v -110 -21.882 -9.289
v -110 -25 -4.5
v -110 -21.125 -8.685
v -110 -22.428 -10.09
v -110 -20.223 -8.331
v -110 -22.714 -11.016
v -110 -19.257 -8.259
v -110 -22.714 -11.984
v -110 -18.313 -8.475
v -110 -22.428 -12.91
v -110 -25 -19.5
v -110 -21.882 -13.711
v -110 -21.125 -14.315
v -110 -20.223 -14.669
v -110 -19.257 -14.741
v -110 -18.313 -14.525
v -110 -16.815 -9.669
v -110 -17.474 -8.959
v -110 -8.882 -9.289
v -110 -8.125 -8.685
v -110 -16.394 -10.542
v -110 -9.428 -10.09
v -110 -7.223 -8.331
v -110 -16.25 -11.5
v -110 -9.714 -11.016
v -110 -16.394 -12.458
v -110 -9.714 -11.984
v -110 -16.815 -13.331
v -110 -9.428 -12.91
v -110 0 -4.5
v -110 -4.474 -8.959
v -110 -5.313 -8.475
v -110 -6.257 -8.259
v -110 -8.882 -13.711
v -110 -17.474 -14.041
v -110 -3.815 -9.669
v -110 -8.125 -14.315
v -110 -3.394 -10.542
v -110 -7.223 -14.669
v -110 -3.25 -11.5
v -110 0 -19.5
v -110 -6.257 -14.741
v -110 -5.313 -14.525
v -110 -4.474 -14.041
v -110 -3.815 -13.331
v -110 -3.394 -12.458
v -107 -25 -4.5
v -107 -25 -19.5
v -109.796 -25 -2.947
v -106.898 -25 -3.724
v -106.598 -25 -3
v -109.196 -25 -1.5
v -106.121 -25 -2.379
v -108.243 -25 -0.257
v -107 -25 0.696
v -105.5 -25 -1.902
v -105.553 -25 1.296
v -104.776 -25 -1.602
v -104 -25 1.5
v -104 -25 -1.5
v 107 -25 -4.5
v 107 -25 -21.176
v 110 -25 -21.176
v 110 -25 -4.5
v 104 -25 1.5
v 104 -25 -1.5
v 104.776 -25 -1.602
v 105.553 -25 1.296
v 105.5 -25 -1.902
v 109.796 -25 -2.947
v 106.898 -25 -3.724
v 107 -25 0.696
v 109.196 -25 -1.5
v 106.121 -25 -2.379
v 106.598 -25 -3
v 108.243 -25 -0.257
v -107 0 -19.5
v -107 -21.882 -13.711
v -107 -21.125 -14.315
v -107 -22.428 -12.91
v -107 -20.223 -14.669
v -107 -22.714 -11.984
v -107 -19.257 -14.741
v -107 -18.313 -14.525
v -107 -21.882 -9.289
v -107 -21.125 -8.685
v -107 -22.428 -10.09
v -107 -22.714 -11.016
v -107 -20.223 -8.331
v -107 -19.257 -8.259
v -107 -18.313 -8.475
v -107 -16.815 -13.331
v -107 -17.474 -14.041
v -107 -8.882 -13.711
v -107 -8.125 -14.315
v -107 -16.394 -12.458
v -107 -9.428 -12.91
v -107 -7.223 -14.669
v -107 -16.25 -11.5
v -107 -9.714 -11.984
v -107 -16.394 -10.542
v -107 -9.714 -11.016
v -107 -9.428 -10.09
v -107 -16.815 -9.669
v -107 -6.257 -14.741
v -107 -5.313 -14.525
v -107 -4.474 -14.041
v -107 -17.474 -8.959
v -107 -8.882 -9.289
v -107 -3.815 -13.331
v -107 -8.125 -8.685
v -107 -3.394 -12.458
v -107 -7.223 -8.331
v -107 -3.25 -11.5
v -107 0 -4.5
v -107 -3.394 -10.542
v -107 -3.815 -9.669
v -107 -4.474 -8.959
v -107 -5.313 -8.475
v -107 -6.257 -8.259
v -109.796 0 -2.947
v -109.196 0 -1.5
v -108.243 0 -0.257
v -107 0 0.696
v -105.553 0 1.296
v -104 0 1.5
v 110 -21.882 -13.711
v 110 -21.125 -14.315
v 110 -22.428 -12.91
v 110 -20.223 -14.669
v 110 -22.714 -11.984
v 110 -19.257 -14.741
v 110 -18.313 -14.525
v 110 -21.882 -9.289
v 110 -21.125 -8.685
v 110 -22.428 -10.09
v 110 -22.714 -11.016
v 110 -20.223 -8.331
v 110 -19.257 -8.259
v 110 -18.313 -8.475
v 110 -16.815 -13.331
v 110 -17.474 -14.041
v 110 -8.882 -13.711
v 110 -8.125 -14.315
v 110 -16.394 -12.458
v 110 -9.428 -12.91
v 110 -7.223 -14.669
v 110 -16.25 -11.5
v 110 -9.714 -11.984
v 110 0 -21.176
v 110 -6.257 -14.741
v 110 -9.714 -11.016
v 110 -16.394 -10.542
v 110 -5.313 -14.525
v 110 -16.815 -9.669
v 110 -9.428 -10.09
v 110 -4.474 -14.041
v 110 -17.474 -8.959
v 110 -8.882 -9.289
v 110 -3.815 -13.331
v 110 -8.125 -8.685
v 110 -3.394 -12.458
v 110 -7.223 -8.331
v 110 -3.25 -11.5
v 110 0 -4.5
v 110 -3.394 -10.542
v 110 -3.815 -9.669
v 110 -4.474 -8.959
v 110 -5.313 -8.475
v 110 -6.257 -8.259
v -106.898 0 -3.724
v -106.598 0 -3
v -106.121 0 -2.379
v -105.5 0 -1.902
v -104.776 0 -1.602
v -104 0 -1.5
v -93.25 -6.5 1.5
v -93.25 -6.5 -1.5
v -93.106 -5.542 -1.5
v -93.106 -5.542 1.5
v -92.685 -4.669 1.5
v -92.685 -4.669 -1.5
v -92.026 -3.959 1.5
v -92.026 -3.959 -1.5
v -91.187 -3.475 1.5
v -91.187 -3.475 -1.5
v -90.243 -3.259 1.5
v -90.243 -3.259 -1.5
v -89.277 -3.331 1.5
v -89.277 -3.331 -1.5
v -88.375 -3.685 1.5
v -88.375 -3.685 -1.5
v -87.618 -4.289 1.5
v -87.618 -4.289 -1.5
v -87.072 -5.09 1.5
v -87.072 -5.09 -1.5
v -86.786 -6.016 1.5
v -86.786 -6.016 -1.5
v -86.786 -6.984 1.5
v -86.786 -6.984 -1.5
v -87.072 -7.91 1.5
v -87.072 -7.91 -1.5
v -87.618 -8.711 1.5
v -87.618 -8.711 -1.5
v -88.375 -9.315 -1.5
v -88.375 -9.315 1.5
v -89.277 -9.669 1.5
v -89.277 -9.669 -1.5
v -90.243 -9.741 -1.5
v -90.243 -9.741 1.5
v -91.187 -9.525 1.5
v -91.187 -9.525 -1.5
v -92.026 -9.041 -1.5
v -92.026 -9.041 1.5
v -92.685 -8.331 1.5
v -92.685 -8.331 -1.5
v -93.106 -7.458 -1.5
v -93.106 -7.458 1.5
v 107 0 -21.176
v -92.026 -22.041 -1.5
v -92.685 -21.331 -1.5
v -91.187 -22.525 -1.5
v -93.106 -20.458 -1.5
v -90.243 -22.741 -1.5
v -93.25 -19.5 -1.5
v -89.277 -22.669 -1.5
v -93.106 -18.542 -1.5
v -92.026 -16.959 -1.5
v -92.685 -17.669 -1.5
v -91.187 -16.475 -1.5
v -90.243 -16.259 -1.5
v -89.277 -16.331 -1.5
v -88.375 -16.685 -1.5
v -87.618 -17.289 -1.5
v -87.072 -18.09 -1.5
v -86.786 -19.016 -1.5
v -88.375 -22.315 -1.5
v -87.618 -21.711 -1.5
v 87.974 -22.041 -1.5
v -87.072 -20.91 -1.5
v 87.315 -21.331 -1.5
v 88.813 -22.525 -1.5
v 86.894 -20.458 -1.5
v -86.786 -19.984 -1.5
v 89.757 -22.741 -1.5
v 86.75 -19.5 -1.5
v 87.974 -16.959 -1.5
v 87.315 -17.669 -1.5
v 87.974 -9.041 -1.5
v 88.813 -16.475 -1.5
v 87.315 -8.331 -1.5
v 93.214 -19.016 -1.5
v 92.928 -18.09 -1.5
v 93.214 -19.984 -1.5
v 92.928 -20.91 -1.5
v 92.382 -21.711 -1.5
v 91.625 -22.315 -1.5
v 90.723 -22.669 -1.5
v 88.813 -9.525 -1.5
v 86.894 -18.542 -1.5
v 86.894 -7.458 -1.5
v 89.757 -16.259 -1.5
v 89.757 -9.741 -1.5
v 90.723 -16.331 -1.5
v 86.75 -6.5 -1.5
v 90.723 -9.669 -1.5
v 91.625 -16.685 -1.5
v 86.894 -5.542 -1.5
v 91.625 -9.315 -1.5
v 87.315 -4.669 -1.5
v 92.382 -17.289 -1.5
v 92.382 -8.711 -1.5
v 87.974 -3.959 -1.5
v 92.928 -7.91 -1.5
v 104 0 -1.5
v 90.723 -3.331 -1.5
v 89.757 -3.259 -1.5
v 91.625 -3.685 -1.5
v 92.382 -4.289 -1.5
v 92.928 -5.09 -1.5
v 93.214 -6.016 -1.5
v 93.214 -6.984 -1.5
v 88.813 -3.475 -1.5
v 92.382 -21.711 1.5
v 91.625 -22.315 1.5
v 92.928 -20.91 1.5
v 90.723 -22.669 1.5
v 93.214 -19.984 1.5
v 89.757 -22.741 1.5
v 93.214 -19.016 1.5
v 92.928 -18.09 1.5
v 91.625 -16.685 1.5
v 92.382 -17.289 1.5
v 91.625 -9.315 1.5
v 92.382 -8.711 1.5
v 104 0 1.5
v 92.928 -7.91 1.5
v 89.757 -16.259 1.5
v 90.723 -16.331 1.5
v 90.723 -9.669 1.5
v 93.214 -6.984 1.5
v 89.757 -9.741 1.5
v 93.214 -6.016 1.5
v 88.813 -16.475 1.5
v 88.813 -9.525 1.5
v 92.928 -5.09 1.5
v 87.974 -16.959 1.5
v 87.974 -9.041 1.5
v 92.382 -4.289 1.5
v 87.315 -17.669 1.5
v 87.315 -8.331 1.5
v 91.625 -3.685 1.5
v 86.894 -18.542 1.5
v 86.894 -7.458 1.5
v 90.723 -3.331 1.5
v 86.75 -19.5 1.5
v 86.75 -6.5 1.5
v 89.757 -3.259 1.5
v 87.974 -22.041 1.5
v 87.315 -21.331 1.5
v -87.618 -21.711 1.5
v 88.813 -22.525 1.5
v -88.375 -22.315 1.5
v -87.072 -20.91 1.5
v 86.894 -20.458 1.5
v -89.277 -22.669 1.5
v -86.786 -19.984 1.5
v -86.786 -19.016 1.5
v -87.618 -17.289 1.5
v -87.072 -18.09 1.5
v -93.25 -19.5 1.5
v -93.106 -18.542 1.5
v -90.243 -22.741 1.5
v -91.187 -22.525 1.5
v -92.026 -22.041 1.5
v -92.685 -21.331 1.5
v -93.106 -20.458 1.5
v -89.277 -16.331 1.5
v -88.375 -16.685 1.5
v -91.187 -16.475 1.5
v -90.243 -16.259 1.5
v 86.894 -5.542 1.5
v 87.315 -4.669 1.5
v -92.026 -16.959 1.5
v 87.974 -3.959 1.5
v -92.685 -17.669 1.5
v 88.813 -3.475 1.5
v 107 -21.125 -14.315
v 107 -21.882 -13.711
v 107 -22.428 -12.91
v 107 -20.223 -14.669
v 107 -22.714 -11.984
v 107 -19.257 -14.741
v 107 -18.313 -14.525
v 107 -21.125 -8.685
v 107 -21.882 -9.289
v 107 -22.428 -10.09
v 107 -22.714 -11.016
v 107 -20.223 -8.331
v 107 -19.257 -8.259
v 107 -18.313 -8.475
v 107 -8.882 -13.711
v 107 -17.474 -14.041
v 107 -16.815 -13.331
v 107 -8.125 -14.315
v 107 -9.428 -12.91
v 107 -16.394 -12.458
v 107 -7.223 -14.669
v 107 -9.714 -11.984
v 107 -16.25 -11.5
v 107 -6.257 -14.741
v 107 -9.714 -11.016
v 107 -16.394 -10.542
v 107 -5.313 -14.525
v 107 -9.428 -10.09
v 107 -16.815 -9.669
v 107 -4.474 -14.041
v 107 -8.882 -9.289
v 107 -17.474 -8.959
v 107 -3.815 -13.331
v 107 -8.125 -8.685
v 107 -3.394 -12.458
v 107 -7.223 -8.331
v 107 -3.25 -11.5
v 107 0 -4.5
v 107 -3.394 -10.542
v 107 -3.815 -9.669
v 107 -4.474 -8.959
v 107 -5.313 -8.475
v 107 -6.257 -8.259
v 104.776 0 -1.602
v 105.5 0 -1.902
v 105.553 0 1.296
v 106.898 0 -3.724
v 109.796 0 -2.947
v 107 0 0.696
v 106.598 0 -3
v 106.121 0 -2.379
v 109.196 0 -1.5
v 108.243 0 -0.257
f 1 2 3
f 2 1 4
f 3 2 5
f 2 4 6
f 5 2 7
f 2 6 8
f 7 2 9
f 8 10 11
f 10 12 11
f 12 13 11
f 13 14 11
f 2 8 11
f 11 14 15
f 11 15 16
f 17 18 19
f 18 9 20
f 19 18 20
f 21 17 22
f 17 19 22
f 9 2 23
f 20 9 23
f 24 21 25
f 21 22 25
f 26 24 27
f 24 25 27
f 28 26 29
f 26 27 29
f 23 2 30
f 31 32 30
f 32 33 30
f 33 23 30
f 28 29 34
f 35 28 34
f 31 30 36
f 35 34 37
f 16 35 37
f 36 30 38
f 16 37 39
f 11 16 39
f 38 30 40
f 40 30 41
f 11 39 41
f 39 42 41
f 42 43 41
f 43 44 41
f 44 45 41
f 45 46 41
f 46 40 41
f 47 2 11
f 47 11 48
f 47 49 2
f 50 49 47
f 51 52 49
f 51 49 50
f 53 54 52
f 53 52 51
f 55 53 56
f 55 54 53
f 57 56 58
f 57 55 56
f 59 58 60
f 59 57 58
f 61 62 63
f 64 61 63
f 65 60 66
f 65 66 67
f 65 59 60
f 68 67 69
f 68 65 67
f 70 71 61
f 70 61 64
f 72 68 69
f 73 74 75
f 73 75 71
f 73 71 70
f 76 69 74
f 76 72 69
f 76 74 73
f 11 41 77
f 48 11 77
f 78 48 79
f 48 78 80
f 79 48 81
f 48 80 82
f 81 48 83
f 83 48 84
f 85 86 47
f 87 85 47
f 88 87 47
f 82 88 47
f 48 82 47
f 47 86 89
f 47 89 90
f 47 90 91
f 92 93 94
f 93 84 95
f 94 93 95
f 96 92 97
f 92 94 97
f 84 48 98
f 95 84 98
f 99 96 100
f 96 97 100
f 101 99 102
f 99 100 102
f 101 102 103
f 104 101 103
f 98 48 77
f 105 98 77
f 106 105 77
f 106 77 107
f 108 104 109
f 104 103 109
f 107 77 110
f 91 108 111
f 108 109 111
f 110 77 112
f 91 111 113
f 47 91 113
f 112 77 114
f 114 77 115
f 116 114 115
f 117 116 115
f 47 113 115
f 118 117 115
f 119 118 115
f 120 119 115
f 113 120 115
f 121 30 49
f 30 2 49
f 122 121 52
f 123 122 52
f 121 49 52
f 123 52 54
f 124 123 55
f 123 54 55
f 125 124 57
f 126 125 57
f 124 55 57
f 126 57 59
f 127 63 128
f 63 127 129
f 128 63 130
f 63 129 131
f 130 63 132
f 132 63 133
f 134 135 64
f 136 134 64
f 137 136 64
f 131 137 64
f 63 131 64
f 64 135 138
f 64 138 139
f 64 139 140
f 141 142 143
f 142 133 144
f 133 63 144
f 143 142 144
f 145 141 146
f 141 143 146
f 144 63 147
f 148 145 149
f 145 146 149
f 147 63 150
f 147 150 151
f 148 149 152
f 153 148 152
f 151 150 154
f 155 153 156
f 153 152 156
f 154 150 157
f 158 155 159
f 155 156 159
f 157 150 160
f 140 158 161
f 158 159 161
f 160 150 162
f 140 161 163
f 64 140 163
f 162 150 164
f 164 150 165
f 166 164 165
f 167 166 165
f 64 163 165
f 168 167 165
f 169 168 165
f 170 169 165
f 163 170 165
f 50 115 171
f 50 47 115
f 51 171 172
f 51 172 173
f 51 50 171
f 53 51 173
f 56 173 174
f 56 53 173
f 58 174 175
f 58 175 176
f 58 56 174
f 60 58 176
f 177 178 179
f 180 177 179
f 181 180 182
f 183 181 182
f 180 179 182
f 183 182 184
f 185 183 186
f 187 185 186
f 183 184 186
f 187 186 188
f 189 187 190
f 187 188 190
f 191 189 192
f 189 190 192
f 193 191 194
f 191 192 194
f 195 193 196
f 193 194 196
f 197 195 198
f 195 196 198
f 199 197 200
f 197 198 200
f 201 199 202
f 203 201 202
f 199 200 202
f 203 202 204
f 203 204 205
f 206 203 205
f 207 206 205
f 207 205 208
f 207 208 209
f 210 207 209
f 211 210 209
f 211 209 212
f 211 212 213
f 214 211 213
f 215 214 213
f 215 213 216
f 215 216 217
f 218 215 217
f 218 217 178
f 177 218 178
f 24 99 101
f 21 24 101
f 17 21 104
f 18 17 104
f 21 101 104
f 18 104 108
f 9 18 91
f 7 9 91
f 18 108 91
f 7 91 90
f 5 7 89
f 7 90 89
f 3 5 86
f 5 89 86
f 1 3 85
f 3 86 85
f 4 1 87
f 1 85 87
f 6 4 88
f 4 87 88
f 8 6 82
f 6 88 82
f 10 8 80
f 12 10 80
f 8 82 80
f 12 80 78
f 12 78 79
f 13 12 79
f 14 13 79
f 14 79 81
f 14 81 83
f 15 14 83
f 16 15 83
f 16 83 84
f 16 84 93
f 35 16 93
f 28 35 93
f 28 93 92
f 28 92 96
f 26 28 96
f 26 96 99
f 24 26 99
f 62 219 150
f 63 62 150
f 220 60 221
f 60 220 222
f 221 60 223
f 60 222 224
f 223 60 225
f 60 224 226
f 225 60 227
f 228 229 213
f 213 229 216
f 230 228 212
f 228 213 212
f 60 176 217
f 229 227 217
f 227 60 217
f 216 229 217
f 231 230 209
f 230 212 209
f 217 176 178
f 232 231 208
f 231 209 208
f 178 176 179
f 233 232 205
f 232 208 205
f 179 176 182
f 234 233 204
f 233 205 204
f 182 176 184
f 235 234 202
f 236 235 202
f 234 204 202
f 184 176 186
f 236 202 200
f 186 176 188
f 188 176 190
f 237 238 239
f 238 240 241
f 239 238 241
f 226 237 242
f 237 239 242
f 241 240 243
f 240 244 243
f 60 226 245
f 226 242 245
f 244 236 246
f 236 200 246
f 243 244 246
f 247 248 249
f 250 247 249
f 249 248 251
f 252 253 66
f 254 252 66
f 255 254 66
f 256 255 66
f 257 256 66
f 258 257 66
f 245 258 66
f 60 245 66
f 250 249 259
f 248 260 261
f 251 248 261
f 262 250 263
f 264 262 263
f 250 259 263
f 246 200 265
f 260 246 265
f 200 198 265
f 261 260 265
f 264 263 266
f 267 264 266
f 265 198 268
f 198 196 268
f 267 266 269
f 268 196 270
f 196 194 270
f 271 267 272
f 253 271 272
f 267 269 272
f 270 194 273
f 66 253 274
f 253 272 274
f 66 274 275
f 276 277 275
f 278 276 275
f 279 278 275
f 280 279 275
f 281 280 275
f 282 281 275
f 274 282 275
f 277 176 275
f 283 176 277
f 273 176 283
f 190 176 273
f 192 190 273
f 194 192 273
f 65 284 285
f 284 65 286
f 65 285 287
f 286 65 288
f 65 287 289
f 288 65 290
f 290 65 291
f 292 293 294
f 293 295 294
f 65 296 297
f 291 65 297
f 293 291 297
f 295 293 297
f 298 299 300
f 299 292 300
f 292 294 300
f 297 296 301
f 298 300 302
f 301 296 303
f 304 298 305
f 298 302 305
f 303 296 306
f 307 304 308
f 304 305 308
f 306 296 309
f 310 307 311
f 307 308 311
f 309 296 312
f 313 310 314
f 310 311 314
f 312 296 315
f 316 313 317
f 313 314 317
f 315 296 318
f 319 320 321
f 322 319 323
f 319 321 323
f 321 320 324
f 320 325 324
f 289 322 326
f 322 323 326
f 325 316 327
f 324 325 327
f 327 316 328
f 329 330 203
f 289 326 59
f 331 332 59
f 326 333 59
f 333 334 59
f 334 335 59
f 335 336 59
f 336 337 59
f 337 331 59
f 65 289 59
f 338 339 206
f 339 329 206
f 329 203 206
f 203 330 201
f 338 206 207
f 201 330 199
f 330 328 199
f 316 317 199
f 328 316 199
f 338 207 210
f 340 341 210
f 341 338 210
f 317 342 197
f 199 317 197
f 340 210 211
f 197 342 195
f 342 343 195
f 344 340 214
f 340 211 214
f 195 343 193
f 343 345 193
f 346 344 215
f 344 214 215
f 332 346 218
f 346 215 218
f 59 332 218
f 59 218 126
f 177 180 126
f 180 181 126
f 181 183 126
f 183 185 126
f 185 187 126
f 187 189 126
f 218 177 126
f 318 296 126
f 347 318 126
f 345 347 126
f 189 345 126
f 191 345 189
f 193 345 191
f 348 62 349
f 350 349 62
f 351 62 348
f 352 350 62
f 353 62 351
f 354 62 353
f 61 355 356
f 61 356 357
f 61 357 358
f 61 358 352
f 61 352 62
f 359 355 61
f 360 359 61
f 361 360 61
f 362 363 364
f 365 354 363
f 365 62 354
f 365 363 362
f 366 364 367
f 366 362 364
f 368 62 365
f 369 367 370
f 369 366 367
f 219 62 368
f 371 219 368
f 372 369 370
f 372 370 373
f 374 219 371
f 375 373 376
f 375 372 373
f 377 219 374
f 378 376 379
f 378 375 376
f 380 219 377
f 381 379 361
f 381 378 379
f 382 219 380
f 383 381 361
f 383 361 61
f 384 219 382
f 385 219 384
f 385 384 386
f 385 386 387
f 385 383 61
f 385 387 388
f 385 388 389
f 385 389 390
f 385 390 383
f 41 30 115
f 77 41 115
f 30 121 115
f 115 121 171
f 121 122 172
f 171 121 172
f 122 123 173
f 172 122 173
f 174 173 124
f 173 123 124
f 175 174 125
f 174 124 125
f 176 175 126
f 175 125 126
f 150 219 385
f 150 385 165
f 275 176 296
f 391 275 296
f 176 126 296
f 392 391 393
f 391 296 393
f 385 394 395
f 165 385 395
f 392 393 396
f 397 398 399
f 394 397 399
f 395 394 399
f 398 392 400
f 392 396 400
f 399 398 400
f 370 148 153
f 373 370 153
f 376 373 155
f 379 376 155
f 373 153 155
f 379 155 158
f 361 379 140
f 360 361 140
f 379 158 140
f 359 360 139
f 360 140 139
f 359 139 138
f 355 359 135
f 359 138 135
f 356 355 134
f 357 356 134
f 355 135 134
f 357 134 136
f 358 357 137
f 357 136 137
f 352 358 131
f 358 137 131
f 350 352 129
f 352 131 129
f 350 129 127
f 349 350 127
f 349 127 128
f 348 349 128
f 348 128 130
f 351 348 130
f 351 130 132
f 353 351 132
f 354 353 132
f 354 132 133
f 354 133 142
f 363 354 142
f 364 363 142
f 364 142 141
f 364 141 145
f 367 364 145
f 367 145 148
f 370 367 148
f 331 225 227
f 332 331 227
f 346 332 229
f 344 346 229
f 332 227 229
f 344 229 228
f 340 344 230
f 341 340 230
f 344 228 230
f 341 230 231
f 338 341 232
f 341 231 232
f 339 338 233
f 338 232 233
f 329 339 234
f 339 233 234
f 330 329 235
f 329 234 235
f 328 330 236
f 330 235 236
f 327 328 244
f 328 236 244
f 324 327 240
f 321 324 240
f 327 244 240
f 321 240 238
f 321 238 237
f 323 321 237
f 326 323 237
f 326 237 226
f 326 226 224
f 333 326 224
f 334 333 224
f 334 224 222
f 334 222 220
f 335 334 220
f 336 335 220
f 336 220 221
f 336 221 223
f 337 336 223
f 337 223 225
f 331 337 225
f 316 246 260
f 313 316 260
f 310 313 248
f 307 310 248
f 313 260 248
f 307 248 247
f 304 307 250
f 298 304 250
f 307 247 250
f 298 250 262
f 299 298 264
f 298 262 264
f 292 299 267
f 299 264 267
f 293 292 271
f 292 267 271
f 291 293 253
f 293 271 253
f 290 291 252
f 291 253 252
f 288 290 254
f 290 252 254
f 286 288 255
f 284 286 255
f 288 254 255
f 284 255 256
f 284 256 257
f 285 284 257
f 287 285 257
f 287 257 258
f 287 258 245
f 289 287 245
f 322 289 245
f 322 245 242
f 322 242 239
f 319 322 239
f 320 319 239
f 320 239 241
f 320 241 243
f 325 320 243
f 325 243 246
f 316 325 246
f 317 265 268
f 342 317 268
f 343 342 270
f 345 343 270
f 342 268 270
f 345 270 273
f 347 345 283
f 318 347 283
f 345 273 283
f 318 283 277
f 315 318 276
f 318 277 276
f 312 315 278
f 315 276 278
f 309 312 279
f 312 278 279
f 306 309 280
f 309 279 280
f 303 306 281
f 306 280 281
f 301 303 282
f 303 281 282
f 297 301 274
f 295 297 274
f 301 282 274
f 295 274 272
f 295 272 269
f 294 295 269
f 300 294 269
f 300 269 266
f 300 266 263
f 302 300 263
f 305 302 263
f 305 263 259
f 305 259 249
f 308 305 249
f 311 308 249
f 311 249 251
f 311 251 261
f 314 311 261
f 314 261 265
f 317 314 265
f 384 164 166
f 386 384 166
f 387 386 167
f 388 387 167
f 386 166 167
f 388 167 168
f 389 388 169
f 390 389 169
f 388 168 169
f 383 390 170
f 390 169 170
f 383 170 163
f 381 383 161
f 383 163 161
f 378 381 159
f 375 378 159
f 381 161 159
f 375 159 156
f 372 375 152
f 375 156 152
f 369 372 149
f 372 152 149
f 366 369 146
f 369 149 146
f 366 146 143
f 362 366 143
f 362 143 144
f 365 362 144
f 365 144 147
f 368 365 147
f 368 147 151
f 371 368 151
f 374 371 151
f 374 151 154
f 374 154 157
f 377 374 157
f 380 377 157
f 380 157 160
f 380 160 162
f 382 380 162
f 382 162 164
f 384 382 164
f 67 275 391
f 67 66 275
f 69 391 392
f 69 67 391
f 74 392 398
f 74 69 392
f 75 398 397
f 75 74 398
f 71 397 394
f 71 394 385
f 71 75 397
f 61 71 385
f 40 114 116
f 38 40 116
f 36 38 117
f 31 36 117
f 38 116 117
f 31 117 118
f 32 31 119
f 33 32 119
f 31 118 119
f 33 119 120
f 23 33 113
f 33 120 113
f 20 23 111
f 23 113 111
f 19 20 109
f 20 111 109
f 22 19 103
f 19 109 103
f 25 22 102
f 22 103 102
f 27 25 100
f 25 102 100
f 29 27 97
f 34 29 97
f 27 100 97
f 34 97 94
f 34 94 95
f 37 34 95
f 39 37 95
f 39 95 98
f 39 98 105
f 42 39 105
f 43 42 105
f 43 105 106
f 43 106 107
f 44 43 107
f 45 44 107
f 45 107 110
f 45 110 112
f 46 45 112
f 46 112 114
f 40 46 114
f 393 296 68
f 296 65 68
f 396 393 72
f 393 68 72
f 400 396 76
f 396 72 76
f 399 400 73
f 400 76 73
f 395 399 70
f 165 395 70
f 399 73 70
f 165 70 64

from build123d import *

# Parameters (mm, degrees)
F0_W     = 3
F0_H     = 18
F0_H_2   = 19.675914
F1_DEPTH = 25
F4_D     = 6.5
F5_D     = 6.5
F6_R     = 3
F7_R     = 6


with BuildPart() as f1:
    # F0 (on Front) → F1 (new body)
    with BuildSketch(Plane.XZ):
        Polygon((110, 1.5), (-110, 1.5), (-110, -1.5), (-107, -1.5), (107, -1.5), (110, -1.5), align=None)
        with Locations((-108.5, -10.5)):
            Rectangle(F0_W, F0_H)
        with Locations((108.5, -11.337957)):
            Rectangle(F0_W, F0_H_2)
    extrude(amount=F1_DEPTH)

    # F4 (through all)
    with Locations(Plane.XY.offset(1.5)):
        with Locations((-90, -19.5), (-90, -6.5), (90, -6.5), (90, -19.5)):
            Hole(F4_D / 2)

    # F5 (through all)
    with Locations(Plane(origin=(-110, 0, 0), x_dir=(0, -1, 0), z_dir=(-1, 0, 0))):
        with Locations((19.5, -11.5), (6.5, -11.5)):
            Hole(F5_D / 2)

    # F6
    f6_edges = [f1.edges().sort_by_distance(p)[0] for p in [
        (-107, -12.5, -1.5),
        (107, -12.5, -1.5),
    ]]
    fillet(f6_edges, radius=F6_R)

    # F7
    f7_edges = [f1.edges().sort_by_distance(p)[0] for p in [
        (-110, -12.5, 1.5),
        (110, -12.5, 1.5),
    ]]
    fillet(f7_edges, radius=F7_R)


solid = f1.part
